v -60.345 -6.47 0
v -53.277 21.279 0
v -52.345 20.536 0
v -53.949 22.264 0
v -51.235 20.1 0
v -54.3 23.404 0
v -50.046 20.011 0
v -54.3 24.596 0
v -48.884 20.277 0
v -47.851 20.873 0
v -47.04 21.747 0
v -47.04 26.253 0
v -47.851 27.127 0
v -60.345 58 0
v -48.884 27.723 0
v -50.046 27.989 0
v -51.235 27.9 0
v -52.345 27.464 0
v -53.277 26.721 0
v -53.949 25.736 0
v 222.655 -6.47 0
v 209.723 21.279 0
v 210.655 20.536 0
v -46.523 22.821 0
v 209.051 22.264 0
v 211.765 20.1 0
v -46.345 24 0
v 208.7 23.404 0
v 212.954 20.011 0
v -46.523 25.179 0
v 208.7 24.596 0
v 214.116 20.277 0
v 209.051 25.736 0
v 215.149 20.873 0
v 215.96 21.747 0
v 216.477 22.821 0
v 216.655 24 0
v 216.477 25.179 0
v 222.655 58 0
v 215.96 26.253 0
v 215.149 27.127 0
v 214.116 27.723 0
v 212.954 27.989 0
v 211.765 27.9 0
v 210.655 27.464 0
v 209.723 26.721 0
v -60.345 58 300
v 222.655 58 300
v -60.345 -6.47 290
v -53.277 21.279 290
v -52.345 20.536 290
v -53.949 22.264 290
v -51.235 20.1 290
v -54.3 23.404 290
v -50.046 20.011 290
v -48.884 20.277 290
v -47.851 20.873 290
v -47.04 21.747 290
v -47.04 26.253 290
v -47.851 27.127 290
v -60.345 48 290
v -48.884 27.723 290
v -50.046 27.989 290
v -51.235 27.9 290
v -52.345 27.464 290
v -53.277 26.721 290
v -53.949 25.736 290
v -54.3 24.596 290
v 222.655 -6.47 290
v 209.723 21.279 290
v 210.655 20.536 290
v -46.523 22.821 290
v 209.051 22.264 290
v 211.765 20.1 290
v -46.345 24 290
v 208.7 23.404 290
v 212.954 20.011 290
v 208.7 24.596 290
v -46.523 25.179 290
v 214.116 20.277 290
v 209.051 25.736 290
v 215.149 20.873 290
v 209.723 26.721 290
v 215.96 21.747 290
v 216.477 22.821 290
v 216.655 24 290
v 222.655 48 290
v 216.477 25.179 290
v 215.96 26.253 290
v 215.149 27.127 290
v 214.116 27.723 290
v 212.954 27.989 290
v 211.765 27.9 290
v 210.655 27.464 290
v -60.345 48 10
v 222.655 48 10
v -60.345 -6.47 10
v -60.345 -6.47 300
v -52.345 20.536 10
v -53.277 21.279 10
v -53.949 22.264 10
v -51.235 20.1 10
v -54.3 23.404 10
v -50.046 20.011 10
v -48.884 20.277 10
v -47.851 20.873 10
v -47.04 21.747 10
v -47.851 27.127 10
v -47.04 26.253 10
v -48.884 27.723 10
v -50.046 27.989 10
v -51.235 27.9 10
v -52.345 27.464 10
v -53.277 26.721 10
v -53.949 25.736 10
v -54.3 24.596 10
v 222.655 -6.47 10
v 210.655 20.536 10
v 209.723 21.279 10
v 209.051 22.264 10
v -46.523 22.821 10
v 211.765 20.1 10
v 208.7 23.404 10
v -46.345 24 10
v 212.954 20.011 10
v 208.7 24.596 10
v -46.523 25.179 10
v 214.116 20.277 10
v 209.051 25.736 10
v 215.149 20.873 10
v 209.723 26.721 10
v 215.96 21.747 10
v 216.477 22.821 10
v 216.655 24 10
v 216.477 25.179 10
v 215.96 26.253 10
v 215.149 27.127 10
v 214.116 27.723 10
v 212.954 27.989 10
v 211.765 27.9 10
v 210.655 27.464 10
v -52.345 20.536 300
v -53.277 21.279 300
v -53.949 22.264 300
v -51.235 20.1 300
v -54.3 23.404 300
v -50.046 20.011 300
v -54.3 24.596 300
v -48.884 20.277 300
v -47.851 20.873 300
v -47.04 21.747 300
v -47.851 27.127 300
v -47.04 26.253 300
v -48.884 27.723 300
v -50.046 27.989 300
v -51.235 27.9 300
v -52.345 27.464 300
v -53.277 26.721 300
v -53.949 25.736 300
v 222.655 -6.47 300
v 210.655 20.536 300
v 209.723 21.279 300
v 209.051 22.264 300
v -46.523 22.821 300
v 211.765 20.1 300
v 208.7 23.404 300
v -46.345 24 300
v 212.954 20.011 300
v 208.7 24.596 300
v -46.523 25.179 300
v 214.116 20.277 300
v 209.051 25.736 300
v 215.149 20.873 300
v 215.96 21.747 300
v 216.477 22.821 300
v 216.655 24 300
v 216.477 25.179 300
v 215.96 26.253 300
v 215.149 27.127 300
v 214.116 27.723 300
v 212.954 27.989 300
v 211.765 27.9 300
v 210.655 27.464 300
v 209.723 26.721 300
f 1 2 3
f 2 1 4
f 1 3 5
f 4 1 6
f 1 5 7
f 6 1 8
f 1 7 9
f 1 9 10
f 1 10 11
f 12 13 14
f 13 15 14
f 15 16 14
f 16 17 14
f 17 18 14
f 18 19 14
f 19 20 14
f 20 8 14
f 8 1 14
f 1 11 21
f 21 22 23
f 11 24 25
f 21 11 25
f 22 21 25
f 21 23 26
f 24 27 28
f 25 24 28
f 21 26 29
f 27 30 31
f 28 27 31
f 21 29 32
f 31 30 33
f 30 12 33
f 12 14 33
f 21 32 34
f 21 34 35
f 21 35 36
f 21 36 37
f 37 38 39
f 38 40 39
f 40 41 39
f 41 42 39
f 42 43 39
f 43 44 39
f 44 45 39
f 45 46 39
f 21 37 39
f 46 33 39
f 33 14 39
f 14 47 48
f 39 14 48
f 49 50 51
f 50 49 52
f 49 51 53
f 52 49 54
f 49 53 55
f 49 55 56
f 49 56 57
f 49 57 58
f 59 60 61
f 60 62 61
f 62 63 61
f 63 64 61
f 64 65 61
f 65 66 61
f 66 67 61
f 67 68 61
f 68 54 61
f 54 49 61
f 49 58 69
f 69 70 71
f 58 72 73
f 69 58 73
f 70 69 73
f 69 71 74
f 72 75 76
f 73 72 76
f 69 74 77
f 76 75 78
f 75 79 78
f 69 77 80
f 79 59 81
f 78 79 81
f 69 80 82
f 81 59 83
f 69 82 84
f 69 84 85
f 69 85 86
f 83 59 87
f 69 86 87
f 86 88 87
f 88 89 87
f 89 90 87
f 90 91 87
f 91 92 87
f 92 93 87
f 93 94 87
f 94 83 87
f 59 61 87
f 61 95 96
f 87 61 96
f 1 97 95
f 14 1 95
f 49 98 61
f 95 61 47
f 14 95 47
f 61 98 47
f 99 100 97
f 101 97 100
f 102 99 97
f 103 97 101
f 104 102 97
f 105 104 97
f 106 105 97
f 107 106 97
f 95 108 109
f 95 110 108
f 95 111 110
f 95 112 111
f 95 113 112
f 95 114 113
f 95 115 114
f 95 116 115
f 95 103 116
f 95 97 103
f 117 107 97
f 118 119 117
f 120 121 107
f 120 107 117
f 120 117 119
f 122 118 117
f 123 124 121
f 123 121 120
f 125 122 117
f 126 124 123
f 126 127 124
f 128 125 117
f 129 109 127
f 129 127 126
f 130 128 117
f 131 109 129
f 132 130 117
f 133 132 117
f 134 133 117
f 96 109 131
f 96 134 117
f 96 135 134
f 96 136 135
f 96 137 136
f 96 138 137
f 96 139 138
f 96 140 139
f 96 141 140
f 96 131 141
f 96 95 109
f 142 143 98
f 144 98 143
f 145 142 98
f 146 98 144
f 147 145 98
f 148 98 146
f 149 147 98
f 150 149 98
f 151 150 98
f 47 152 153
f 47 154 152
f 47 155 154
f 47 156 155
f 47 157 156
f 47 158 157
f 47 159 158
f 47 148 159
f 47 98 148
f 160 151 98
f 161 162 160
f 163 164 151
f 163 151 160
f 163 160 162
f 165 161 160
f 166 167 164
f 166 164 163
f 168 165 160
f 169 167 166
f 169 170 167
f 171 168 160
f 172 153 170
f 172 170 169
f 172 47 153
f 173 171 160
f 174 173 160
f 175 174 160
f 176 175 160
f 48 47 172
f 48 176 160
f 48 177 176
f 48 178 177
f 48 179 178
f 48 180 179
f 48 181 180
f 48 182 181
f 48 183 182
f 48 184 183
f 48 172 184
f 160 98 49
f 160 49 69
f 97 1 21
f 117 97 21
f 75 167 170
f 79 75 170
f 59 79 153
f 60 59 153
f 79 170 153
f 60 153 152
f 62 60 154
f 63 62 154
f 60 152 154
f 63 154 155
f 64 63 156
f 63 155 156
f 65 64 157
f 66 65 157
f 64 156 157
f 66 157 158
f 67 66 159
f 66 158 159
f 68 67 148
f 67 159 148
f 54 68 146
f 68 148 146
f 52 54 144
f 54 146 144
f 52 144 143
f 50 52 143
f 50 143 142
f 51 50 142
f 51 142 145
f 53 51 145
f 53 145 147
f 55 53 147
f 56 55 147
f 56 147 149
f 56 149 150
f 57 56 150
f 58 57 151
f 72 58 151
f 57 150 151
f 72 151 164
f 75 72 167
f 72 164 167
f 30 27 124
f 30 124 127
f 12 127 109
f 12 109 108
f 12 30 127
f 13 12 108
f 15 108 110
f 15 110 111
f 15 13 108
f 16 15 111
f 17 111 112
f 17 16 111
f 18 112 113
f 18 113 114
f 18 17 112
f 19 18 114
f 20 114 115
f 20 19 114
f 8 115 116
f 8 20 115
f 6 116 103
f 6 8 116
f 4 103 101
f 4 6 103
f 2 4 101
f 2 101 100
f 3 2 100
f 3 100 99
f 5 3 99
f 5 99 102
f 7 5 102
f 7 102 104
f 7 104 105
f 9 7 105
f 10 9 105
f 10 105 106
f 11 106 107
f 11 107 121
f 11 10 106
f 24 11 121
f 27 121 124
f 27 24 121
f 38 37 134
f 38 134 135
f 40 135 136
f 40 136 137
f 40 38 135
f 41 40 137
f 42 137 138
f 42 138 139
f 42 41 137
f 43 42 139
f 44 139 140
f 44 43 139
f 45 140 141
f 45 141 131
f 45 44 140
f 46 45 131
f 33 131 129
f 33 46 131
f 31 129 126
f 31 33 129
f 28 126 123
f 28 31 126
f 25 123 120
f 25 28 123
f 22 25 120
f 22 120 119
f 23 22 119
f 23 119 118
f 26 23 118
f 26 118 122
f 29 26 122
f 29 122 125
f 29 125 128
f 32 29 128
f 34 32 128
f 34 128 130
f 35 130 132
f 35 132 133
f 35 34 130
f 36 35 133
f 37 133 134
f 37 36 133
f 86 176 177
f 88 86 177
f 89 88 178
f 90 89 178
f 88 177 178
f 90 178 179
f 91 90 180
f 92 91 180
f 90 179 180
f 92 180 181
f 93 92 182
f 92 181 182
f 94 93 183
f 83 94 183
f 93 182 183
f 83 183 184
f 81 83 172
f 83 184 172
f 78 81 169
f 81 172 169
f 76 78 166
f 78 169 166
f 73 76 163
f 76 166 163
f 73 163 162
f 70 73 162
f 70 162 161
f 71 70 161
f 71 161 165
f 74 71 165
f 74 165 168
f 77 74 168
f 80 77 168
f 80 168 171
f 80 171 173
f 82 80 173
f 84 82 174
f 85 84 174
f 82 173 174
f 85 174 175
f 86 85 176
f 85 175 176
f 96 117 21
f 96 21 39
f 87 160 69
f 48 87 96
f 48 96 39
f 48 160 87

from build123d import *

# Parameters (mm, degrees)
SKETCH_2_R      = 4
EXTRUDE_1_DEPTH = 10
SKETCH_3_W      = 283
SKETCH_3_H      = 10
EXTRUDE_5_DEPTH = 300
SKETCH_6_W      = 283
SKETCH_6_H      = 64.47
SKETCH_6_R      = 4
EXTRUDE_7_DEPTH = 10


with BuildPart() as part:
    # 草图2 → 凸台-拉伸1 (new body)
    with BuildSketch(Plane.XY):
        Polygon((212.655000043, 48), (-50.344999957, 48), (-60.344999957, 48), (-60.344999957, -3.53), (-60.344999957, -6.47), (222.655000043, -6.47), (222.655000043, -3.53), (222.655000043, 48), align=None)
        with Locations((212.655000043, 24)):
            Circle(SKETCH_2_R, mode=Mode.SUBTRACT)
        with Locations((-50.344999957, 24)):
            Circle(SKETCH_2_R, mode=Mode.SUBTRACT)
    extrude(amount=EXTRUDE_1_DEPTH)

    # 草图3 → 凸台-拉伸5 (add)
    with BuildSketch(Plane.XY):
        with Locations((81.155000043, 53)):
            Rectangle(SKETCH_3_W, SKETCH_3_H)
    extrude(amount=EXTRUDE_5_DEPTH)

    # 草图6 → 凸台-拉伸7 (add)
    with BuildSketch(Plane.XY.offset(300)):
        with Locations((81.155000043, 25.765)):
            Rectangle(SKETCH_6_W, SKETCH_6_H)
        with Locations((-50.344999957, 24)):
            Circle(SKETCH_6_R, mode=Mode.SUBTRACT)
        with Locations((212.655000043, 24)):
            Circle(SKETCH_6_R, mode=Mode.SUBTRACT)
    extrude(amount=-EXTRUDE_7_DEPTH)


solid = part.part
